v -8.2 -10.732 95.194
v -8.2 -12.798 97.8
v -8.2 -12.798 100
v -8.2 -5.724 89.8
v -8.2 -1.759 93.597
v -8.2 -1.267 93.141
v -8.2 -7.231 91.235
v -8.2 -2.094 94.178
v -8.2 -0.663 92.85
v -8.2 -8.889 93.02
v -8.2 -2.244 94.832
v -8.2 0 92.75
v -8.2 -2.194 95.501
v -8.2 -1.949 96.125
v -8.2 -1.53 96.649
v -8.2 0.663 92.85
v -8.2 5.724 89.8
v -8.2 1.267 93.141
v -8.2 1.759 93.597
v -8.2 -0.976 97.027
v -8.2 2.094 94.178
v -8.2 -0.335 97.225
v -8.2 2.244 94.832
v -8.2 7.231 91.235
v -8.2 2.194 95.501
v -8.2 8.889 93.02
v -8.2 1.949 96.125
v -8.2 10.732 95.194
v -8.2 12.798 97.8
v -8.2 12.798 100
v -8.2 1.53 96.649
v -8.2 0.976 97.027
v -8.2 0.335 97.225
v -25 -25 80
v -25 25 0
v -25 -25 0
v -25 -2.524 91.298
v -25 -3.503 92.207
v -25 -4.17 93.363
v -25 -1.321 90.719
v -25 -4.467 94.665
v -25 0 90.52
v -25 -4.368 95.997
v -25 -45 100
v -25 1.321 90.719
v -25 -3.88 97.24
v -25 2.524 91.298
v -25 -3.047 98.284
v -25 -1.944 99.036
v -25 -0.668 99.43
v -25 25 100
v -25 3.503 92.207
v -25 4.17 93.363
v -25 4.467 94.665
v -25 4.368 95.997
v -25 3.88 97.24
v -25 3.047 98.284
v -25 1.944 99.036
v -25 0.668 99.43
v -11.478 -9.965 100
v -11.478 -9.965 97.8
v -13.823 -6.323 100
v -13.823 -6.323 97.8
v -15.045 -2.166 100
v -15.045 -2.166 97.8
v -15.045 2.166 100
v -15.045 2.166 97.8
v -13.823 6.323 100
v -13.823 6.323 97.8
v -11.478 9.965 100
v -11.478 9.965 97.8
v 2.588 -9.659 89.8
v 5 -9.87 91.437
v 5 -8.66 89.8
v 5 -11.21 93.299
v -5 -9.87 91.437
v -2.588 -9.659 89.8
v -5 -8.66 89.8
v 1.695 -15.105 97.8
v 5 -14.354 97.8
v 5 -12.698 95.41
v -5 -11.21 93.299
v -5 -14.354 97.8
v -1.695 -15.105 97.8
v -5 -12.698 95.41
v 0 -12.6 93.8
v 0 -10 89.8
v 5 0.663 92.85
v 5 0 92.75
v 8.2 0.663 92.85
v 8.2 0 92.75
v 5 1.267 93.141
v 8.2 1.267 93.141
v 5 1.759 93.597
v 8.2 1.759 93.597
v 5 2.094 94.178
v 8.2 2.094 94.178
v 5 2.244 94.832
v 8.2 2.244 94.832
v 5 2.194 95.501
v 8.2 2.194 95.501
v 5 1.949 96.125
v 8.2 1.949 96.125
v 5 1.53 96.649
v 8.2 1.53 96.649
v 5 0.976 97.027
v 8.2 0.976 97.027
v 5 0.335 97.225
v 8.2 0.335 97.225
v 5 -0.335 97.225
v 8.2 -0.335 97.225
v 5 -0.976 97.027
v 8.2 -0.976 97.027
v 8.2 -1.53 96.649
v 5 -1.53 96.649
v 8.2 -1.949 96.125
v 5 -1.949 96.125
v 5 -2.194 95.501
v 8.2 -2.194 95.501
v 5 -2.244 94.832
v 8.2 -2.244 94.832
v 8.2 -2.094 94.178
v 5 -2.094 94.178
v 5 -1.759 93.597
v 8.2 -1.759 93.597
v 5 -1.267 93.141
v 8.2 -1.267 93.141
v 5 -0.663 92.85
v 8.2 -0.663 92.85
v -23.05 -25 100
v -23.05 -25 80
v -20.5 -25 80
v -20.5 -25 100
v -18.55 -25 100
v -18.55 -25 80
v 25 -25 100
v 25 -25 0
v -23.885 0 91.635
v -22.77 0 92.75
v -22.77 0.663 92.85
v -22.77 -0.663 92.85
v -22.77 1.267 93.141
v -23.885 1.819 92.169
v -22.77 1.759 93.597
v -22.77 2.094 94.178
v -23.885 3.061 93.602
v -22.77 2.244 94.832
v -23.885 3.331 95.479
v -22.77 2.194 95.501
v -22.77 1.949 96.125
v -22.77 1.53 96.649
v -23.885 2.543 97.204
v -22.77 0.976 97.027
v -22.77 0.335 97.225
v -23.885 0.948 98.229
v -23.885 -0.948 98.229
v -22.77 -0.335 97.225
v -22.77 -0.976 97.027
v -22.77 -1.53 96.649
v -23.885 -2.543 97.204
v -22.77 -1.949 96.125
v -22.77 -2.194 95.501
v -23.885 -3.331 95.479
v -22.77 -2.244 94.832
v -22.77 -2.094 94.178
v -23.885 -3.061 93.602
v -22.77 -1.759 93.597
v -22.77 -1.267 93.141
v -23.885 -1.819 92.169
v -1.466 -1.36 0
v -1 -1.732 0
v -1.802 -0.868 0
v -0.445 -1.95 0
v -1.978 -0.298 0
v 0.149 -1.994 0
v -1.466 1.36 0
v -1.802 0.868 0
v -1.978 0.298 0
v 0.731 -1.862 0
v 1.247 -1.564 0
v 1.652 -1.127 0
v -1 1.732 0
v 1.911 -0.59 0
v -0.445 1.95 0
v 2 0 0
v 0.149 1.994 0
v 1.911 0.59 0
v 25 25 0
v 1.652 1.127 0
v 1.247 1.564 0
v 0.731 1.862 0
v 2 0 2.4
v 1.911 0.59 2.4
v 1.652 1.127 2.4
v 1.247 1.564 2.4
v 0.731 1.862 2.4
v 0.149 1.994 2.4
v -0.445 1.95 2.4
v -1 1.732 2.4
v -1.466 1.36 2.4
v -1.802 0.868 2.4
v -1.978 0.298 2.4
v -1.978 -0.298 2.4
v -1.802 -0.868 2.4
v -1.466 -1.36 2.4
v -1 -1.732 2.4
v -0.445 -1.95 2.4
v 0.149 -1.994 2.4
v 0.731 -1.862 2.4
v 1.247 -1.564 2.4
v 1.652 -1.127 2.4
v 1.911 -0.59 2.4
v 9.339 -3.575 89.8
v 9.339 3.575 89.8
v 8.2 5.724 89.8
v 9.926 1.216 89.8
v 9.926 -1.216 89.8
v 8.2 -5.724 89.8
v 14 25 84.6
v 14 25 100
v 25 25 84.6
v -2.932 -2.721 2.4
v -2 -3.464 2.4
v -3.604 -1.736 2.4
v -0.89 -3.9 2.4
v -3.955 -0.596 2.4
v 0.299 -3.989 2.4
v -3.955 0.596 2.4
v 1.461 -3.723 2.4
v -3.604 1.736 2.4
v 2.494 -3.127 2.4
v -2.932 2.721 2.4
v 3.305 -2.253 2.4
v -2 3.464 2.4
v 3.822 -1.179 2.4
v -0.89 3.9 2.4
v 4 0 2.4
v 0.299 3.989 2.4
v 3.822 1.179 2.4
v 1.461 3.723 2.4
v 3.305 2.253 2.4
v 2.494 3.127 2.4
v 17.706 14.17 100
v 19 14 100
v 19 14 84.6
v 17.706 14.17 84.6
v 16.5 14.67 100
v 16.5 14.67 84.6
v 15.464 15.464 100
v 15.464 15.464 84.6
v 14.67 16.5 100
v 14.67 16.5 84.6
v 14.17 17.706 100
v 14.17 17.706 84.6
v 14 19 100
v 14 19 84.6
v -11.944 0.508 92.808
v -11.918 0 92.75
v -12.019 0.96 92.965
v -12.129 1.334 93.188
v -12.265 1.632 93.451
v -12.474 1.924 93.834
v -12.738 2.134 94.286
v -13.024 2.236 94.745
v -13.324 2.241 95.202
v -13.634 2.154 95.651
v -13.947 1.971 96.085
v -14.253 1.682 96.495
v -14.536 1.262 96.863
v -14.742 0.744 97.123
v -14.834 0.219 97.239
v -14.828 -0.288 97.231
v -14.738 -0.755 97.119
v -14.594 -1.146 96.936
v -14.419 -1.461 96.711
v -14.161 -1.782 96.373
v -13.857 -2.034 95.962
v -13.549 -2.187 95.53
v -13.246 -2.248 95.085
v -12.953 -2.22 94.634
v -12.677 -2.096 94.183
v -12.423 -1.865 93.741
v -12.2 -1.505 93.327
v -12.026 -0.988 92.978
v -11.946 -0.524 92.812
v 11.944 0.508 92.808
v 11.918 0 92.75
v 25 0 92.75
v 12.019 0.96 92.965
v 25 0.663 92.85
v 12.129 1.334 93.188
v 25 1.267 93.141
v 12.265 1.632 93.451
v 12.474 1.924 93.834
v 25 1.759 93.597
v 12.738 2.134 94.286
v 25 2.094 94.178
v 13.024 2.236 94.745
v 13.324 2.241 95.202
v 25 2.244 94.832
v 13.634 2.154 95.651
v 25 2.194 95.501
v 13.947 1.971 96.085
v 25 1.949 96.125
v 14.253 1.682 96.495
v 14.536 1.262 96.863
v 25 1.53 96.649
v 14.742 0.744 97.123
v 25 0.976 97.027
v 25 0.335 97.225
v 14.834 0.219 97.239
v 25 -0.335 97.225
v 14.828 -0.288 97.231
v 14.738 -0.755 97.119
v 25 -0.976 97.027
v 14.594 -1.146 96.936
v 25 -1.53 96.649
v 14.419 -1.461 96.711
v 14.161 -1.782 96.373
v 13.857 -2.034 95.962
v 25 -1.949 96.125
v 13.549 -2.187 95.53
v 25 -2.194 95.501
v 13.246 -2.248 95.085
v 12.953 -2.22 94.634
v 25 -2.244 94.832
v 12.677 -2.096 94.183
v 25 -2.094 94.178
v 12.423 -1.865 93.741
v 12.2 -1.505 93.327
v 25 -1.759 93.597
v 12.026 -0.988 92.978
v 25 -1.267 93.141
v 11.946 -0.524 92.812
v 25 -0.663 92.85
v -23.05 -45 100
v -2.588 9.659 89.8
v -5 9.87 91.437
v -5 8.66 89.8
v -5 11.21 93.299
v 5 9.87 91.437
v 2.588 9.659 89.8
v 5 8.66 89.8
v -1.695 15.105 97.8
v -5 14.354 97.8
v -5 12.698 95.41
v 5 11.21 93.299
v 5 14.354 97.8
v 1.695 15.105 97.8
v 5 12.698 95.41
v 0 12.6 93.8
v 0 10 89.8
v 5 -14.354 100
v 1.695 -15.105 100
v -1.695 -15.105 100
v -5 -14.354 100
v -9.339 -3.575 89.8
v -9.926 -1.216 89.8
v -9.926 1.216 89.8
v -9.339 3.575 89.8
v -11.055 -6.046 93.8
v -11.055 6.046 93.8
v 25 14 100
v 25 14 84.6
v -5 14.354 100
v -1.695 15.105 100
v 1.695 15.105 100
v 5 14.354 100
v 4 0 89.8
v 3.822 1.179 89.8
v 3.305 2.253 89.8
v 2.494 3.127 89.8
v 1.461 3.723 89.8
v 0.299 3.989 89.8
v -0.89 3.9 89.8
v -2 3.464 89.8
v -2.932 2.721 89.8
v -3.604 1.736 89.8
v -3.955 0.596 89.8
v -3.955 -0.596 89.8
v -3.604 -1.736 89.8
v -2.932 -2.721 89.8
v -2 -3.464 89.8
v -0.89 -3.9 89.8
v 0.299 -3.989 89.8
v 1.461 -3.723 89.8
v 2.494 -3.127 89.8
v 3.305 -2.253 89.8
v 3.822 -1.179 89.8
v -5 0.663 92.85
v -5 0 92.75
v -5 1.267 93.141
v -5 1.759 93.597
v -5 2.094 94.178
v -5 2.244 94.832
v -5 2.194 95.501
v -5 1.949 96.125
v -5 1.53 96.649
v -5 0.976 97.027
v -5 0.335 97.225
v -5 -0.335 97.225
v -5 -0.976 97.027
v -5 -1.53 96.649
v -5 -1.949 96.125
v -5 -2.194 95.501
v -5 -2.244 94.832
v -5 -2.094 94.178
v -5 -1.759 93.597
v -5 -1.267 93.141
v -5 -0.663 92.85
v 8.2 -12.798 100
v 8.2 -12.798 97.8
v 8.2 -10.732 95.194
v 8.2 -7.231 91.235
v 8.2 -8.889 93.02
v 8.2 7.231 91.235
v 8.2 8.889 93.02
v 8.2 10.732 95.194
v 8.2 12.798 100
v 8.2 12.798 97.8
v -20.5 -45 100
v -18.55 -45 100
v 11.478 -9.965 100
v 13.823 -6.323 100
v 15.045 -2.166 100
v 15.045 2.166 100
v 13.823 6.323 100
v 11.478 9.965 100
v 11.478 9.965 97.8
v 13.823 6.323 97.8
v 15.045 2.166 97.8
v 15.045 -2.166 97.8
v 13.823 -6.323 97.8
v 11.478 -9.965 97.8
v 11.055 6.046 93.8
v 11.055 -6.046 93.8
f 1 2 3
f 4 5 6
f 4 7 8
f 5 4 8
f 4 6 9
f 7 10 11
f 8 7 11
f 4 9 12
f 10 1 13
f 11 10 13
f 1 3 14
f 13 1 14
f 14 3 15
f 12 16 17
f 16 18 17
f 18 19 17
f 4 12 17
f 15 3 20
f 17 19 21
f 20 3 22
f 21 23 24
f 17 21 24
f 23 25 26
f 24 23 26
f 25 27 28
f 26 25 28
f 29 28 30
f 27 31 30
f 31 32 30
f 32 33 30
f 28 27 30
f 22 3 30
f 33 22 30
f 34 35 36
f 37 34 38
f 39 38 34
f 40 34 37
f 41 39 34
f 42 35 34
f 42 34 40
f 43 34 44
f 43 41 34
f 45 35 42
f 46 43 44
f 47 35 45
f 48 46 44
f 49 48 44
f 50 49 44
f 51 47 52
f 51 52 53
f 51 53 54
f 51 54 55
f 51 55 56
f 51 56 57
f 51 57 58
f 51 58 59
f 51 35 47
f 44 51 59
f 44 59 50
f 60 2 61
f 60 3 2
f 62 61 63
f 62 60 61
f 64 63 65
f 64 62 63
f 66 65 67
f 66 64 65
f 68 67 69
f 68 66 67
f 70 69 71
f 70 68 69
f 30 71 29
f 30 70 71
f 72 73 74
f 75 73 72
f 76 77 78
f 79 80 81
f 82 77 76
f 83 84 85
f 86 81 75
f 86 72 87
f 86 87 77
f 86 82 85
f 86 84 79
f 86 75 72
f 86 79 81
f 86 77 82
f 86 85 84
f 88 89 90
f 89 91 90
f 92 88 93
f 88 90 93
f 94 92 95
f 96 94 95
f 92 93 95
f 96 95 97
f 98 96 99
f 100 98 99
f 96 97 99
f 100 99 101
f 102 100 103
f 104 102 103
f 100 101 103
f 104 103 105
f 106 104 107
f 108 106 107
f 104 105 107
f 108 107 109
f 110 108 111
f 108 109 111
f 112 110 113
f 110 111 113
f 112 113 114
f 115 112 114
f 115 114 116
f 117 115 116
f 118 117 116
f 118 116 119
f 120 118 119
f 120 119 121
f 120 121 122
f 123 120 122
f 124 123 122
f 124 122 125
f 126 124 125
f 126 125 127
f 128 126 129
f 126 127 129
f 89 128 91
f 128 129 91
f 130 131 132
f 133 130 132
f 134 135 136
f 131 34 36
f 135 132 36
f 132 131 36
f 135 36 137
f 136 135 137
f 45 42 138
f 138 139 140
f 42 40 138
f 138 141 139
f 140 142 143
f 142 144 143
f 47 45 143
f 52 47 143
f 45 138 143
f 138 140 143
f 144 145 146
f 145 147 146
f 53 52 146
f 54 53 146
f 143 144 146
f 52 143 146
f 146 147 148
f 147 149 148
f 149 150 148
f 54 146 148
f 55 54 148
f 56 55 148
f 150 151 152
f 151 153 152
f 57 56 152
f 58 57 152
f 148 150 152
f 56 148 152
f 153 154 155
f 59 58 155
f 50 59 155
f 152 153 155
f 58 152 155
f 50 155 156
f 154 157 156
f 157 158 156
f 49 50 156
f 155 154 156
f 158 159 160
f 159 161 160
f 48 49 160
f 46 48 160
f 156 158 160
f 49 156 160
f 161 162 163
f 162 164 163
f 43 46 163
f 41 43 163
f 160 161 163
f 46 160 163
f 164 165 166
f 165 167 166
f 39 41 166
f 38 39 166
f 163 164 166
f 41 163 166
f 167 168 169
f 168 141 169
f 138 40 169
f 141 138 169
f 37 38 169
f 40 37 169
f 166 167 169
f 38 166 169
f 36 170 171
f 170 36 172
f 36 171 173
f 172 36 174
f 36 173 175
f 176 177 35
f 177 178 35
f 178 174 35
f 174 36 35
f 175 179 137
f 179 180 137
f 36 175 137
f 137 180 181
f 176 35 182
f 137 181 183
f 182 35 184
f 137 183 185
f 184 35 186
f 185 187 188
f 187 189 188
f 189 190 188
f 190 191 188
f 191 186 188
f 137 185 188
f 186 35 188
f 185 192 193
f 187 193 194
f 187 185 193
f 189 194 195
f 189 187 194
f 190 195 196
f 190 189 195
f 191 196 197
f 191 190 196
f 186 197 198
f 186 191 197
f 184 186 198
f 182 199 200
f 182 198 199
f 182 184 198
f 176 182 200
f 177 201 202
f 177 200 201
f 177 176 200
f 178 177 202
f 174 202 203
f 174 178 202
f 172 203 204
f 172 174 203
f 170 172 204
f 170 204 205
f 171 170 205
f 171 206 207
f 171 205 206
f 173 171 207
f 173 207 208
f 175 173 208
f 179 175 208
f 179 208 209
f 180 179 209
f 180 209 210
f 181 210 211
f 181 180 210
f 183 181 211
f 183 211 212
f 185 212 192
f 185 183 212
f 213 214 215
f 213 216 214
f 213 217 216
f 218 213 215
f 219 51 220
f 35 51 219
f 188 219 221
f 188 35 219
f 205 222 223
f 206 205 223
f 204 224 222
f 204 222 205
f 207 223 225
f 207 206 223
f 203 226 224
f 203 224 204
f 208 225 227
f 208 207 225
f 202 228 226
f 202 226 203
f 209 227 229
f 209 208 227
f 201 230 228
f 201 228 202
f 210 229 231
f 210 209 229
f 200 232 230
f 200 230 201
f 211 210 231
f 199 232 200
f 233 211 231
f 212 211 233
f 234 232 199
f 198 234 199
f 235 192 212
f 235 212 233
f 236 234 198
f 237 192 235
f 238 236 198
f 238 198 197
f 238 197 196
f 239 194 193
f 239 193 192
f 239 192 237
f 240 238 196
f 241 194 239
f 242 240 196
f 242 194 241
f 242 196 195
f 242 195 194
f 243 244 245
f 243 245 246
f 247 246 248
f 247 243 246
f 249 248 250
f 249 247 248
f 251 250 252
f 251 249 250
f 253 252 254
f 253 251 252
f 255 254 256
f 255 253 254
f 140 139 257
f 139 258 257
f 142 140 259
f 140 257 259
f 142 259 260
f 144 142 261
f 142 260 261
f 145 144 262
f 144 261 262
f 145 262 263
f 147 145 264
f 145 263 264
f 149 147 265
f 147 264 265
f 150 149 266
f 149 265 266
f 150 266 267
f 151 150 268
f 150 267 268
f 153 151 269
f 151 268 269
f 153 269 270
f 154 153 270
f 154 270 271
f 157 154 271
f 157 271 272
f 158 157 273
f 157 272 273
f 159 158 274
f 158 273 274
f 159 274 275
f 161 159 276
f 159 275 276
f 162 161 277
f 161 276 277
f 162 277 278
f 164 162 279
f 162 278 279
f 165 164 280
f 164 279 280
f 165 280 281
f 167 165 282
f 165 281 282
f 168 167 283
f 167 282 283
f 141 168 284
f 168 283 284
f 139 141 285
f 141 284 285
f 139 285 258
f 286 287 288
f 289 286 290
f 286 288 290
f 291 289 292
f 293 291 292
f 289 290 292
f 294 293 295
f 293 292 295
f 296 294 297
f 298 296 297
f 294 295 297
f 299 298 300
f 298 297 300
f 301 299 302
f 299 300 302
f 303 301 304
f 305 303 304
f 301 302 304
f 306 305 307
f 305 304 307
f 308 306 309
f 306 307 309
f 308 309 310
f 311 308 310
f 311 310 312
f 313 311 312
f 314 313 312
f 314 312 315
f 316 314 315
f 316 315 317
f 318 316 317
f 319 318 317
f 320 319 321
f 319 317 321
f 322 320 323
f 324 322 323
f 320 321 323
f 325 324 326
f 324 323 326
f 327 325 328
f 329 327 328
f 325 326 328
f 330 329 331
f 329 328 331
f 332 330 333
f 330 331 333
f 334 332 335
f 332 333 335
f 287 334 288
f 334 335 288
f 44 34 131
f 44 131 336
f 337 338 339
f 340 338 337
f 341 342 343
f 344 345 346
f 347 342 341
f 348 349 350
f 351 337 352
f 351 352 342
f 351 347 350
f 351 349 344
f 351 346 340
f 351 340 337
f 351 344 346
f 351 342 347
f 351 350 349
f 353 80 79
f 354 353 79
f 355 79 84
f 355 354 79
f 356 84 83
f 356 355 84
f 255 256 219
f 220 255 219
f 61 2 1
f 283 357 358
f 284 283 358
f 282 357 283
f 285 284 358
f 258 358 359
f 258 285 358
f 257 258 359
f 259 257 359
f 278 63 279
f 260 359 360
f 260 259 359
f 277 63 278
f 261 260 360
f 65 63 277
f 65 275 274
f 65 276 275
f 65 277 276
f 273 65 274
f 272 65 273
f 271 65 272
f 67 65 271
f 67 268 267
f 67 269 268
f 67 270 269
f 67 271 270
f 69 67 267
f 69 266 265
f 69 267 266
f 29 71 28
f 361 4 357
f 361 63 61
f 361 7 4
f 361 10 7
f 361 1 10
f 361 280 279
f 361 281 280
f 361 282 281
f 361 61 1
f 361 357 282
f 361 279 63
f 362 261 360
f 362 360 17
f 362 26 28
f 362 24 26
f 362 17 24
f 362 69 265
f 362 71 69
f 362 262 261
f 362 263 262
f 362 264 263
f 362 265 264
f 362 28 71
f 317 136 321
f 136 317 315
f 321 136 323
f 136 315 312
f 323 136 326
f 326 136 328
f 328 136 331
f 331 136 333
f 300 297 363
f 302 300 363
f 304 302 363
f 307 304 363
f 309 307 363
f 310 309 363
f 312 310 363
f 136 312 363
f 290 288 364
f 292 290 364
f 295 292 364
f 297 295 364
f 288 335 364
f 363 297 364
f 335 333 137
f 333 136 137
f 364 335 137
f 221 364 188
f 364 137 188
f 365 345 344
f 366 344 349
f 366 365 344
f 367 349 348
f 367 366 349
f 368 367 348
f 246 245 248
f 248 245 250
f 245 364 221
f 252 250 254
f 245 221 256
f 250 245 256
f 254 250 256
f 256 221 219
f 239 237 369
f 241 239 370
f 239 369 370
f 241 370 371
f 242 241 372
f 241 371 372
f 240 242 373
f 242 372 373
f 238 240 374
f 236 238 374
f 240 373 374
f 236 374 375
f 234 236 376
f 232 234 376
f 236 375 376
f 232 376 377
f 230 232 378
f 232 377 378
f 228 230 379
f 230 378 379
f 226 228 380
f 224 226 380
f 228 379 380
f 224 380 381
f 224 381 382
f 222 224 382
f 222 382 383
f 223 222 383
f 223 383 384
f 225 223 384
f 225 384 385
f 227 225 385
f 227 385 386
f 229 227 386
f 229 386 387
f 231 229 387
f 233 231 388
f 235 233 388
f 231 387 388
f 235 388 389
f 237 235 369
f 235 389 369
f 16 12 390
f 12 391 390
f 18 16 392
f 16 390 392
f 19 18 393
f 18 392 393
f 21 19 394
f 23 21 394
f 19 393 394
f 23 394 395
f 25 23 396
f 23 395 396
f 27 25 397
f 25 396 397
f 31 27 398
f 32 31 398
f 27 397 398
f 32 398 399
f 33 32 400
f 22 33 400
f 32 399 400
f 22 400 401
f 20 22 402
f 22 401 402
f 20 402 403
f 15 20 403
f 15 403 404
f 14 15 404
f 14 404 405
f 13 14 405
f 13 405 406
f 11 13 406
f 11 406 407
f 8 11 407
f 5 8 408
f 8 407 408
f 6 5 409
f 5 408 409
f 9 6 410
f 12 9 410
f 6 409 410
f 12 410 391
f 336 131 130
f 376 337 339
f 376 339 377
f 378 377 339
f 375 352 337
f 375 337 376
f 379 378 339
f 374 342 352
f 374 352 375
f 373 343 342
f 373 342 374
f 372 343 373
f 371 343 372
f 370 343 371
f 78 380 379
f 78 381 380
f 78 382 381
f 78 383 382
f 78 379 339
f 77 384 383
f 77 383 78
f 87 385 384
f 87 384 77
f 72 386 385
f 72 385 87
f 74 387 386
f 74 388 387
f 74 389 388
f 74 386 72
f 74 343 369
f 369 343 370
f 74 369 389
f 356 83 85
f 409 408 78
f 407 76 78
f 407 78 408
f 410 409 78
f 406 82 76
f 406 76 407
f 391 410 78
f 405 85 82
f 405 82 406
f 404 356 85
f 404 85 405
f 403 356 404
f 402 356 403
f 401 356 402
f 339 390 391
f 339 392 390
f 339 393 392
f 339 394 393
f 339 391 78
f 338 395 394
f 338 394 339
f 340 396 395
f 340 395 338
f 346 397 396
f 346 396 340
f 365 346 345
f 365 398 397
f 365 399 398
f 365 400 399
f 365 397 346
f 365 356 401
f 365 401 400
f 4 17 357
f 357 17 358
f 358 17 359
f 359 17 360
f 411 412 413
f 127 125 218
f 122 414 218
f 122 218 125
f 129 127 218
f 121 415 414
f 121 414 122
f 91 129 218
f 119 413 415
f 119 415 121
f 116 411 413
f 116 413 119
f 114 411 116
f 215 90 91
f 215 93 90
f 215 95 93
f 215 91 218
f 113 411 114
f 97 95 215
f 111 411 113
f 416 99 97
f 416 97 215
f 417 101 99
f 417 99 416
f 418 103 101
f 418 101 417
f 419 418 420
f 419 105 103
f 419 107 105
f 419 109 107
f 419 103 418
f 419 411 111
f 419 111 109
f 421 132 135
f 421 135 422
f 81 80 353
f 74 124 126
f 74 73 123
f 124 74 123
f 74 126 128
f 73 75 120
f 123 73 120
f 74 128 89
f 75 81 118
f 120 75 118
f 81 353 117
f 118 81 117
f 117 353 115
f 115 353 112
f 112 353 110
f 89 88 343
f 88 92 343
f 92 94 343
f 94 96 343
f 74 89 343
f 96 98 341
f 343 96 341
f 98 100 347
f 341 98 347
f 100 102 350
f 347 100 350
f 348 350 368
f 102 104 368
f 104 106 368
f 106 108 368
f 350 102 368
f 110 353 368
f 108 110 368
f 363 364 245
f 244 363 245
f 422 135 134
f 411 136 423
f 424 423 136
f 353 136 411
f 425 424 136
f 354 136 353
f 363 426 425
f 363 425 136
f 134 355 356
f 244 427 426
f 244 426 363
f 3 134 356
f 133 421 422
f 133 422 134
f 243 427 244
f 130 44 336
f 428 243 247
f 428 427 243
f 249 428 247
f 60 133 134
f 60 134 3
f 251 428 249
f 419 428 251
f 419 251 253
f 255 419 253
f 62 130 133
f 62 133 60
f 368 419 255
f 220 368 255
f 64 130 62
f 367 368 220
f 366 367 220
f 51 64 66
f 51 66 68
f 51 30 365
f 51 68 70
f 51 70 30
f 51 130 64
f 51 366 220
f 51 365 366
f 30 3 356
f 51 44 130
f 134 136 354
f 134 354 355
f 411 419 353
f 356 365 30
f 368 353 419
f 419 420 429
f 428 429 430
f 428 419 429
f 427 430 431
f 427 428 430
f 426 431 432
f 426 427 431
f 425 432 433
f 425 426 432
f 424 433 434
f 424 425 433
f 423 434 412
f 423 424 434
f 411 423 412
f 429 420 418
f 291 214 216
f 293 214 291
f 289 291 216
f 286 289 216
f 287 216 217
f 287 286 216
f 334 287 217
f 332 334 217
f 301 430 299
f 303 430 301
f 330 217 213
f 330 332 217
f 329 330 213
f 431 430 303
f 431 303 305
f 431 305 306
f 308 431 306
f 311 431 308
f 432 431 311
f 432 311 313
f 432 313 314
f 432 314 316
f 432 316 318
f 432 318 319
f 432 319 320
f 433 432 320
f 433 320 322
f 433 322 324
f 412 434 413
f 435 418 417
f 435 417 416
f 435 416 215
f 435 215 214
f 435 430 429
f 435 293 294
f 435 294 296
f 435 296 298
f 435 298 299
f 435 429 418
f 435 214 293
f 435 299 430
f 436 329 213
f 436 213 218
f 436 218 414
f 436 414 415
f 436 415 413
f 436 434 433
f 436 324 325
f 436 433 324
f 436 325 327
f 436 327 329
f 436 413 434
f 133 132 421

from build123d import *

# Parameters (mm, degrees)
CROQUIS1_W                                           = 50
CROQUIS1_H                                           = 50
CROQUIS1_R                                           = 2
SALIENTE_EXTRUIR2_DEPTH                              = 100
CROQUIS4_W                                           = 3.2
CROQUIS4_H                                           = 40
SALIENTE_EXTRUIR5_DEPTH                              = 10.2
CROQUIS8_R                                           = 4
CORTAR_EXTRUIR3_DEPTH                                = 87.4
CORTAR_EXTRUIR2_START                                = -50
CROQUIS7_R                                           = 2
CORTAR_EXTRUIR2_DEPTH                                = 50
REFRENTADO_PARA_TORNILLO_TAP_N_CON_CABEZ_D           = 4.5
REFRENTADO_PARA_TORNILLO_TAP_N_CON_CABEZ_CSINK_D     = 8.96
REFRENTADO_PARA_TORNILLO_TAP_N_CON_CABEZ_CSINK_ANGLE = 90
SALIENTE_EXTRUIR6_DEPTH                              = 1.95
SALIENTE_EXTRUIR7_START                              = -4.5
SALIENTE_EXTRUIR7_DEPTH                              = 1.95
CORTAR_EXTRUIR4_DEPTH                                = 15.4


with BuildPart() as part:
    # Croquis1 → Saliente-Extruir2 (new body)
    with BuildSketch(Plane.XY):
        Rectangle(CROQUIS1_W, CROQUIS1_H)
        Circle(CROQUIS1_R, mode=Mode.SUBTRACT)
    extrude(amount=SALIENTE_EXTRUIR2_DEPTH)

    # Croquis2 → Cortar-Revolución1 (revolve, cut)
    with BuildSketch(Plane(origin=(0, 0, 0), x_dir=(0, 0, -1), z_dir=(1, 0, 0))):
        Polygon((-100, 15.2), (-100, 0), (-89.8, 0), (-89.8, 10), (-97.8, 15.2), align=None)
    revolve(axis=Axis((0, 0, 100), (0, 0, -1)), mode=Mode.SUBTRACT)

    # Croquis4 → Saliente-Extruir5 (add)
    with BuildSketch(Plane.XY.offset(100)):
        with Locations((-6.6, 0)):
            Rectangle(CROQUIS4_W, CROQUIS4_H)
        with Locations((6.6, 0)):
            Rectangle(CROQUIS4_W, CROQUIS4_H)
    extrude(amount=-SALIENTE_EXTRUIR5_DEPTH)

    # Croquis8 → Cortar-Extruir3 (cut)
    with BuildSketch(Plane.XY.offset(89.8)):
        Circle(CROQUIS8_R)
    extrude(amount=-CORTAR_EXTRUIR3_DEPTH, mode=Mode.SUBTRACT)

    # Croquis7 → Cortar-Extruir2 (cut)
    with BuildSketch(Plane.ZY.offset(25).offset(CORTAR_EXTRUIR2_START)):
        with Locations((95, 0)):
            Circle(CROQUIS7_R)
    extrude(amount=CORTAR_EXTRUIR2_DEPTH, mode=Mode.SUBTRACT)

    # Refrentado para tornillo tapón con cabeza plana de clavija de M41 (through all)
    with Locations(Plane.ZY.offset(25)):
        with Locations((95, 0)):
            CounterSinkHole(REFRENTADO_PARA_TORNILLO_TAP_N_CON_CABEZ_D / 2, REFRENTADO_PARA_TORNILLO_TAP_N_CON_CABEZ_CSINK_D / 2, counter_sink_angle=REFRENTADO_PARA_TORNILLO_TAP_N_CON_CABEZ_CSINK_ANGLE)

    # Croquis12 → Saliente-Extruir6 (add)
    with BuildSketch(Plane.ZY.offset(25)):
        Polygon((100, -25), (80, -25), (100, -45), align=None)
    extrude(amount=-SALIENTE_EXTRUIR6_DEPTH)

    # Croquis12<2> → Saliente-Extruir7 (add)
    with BuildSketch(Plane.ZY.offset(25).offset(SALIENTE_EXTRUIR7_START)):
        Polygon((100, -25), (80, -25), (100, -45), align=None)
    extrude(amount=-SALIENTE_EXTRUIR7_DEPTH)

    # Croquis13 → Cortar-Extruir4 (cut)
    with BuildSketch(Plane.XY.offset(100)):
        with BuildLine():
            Line((25, 25), (25, 14))
            Line((25, 14), (19, 14))
            ThreePointArc((19, 14), (15.464466094, 15.464466094), (14, 19))
            Line((14, 19), (14, 25))
            Line((14, 25), (25, 25))
        make_face()
    extrude(amount=-CORTAR_EXTRUIR4_DEPTH, mode=Mode.SUBTRACT)


solid = part.part
